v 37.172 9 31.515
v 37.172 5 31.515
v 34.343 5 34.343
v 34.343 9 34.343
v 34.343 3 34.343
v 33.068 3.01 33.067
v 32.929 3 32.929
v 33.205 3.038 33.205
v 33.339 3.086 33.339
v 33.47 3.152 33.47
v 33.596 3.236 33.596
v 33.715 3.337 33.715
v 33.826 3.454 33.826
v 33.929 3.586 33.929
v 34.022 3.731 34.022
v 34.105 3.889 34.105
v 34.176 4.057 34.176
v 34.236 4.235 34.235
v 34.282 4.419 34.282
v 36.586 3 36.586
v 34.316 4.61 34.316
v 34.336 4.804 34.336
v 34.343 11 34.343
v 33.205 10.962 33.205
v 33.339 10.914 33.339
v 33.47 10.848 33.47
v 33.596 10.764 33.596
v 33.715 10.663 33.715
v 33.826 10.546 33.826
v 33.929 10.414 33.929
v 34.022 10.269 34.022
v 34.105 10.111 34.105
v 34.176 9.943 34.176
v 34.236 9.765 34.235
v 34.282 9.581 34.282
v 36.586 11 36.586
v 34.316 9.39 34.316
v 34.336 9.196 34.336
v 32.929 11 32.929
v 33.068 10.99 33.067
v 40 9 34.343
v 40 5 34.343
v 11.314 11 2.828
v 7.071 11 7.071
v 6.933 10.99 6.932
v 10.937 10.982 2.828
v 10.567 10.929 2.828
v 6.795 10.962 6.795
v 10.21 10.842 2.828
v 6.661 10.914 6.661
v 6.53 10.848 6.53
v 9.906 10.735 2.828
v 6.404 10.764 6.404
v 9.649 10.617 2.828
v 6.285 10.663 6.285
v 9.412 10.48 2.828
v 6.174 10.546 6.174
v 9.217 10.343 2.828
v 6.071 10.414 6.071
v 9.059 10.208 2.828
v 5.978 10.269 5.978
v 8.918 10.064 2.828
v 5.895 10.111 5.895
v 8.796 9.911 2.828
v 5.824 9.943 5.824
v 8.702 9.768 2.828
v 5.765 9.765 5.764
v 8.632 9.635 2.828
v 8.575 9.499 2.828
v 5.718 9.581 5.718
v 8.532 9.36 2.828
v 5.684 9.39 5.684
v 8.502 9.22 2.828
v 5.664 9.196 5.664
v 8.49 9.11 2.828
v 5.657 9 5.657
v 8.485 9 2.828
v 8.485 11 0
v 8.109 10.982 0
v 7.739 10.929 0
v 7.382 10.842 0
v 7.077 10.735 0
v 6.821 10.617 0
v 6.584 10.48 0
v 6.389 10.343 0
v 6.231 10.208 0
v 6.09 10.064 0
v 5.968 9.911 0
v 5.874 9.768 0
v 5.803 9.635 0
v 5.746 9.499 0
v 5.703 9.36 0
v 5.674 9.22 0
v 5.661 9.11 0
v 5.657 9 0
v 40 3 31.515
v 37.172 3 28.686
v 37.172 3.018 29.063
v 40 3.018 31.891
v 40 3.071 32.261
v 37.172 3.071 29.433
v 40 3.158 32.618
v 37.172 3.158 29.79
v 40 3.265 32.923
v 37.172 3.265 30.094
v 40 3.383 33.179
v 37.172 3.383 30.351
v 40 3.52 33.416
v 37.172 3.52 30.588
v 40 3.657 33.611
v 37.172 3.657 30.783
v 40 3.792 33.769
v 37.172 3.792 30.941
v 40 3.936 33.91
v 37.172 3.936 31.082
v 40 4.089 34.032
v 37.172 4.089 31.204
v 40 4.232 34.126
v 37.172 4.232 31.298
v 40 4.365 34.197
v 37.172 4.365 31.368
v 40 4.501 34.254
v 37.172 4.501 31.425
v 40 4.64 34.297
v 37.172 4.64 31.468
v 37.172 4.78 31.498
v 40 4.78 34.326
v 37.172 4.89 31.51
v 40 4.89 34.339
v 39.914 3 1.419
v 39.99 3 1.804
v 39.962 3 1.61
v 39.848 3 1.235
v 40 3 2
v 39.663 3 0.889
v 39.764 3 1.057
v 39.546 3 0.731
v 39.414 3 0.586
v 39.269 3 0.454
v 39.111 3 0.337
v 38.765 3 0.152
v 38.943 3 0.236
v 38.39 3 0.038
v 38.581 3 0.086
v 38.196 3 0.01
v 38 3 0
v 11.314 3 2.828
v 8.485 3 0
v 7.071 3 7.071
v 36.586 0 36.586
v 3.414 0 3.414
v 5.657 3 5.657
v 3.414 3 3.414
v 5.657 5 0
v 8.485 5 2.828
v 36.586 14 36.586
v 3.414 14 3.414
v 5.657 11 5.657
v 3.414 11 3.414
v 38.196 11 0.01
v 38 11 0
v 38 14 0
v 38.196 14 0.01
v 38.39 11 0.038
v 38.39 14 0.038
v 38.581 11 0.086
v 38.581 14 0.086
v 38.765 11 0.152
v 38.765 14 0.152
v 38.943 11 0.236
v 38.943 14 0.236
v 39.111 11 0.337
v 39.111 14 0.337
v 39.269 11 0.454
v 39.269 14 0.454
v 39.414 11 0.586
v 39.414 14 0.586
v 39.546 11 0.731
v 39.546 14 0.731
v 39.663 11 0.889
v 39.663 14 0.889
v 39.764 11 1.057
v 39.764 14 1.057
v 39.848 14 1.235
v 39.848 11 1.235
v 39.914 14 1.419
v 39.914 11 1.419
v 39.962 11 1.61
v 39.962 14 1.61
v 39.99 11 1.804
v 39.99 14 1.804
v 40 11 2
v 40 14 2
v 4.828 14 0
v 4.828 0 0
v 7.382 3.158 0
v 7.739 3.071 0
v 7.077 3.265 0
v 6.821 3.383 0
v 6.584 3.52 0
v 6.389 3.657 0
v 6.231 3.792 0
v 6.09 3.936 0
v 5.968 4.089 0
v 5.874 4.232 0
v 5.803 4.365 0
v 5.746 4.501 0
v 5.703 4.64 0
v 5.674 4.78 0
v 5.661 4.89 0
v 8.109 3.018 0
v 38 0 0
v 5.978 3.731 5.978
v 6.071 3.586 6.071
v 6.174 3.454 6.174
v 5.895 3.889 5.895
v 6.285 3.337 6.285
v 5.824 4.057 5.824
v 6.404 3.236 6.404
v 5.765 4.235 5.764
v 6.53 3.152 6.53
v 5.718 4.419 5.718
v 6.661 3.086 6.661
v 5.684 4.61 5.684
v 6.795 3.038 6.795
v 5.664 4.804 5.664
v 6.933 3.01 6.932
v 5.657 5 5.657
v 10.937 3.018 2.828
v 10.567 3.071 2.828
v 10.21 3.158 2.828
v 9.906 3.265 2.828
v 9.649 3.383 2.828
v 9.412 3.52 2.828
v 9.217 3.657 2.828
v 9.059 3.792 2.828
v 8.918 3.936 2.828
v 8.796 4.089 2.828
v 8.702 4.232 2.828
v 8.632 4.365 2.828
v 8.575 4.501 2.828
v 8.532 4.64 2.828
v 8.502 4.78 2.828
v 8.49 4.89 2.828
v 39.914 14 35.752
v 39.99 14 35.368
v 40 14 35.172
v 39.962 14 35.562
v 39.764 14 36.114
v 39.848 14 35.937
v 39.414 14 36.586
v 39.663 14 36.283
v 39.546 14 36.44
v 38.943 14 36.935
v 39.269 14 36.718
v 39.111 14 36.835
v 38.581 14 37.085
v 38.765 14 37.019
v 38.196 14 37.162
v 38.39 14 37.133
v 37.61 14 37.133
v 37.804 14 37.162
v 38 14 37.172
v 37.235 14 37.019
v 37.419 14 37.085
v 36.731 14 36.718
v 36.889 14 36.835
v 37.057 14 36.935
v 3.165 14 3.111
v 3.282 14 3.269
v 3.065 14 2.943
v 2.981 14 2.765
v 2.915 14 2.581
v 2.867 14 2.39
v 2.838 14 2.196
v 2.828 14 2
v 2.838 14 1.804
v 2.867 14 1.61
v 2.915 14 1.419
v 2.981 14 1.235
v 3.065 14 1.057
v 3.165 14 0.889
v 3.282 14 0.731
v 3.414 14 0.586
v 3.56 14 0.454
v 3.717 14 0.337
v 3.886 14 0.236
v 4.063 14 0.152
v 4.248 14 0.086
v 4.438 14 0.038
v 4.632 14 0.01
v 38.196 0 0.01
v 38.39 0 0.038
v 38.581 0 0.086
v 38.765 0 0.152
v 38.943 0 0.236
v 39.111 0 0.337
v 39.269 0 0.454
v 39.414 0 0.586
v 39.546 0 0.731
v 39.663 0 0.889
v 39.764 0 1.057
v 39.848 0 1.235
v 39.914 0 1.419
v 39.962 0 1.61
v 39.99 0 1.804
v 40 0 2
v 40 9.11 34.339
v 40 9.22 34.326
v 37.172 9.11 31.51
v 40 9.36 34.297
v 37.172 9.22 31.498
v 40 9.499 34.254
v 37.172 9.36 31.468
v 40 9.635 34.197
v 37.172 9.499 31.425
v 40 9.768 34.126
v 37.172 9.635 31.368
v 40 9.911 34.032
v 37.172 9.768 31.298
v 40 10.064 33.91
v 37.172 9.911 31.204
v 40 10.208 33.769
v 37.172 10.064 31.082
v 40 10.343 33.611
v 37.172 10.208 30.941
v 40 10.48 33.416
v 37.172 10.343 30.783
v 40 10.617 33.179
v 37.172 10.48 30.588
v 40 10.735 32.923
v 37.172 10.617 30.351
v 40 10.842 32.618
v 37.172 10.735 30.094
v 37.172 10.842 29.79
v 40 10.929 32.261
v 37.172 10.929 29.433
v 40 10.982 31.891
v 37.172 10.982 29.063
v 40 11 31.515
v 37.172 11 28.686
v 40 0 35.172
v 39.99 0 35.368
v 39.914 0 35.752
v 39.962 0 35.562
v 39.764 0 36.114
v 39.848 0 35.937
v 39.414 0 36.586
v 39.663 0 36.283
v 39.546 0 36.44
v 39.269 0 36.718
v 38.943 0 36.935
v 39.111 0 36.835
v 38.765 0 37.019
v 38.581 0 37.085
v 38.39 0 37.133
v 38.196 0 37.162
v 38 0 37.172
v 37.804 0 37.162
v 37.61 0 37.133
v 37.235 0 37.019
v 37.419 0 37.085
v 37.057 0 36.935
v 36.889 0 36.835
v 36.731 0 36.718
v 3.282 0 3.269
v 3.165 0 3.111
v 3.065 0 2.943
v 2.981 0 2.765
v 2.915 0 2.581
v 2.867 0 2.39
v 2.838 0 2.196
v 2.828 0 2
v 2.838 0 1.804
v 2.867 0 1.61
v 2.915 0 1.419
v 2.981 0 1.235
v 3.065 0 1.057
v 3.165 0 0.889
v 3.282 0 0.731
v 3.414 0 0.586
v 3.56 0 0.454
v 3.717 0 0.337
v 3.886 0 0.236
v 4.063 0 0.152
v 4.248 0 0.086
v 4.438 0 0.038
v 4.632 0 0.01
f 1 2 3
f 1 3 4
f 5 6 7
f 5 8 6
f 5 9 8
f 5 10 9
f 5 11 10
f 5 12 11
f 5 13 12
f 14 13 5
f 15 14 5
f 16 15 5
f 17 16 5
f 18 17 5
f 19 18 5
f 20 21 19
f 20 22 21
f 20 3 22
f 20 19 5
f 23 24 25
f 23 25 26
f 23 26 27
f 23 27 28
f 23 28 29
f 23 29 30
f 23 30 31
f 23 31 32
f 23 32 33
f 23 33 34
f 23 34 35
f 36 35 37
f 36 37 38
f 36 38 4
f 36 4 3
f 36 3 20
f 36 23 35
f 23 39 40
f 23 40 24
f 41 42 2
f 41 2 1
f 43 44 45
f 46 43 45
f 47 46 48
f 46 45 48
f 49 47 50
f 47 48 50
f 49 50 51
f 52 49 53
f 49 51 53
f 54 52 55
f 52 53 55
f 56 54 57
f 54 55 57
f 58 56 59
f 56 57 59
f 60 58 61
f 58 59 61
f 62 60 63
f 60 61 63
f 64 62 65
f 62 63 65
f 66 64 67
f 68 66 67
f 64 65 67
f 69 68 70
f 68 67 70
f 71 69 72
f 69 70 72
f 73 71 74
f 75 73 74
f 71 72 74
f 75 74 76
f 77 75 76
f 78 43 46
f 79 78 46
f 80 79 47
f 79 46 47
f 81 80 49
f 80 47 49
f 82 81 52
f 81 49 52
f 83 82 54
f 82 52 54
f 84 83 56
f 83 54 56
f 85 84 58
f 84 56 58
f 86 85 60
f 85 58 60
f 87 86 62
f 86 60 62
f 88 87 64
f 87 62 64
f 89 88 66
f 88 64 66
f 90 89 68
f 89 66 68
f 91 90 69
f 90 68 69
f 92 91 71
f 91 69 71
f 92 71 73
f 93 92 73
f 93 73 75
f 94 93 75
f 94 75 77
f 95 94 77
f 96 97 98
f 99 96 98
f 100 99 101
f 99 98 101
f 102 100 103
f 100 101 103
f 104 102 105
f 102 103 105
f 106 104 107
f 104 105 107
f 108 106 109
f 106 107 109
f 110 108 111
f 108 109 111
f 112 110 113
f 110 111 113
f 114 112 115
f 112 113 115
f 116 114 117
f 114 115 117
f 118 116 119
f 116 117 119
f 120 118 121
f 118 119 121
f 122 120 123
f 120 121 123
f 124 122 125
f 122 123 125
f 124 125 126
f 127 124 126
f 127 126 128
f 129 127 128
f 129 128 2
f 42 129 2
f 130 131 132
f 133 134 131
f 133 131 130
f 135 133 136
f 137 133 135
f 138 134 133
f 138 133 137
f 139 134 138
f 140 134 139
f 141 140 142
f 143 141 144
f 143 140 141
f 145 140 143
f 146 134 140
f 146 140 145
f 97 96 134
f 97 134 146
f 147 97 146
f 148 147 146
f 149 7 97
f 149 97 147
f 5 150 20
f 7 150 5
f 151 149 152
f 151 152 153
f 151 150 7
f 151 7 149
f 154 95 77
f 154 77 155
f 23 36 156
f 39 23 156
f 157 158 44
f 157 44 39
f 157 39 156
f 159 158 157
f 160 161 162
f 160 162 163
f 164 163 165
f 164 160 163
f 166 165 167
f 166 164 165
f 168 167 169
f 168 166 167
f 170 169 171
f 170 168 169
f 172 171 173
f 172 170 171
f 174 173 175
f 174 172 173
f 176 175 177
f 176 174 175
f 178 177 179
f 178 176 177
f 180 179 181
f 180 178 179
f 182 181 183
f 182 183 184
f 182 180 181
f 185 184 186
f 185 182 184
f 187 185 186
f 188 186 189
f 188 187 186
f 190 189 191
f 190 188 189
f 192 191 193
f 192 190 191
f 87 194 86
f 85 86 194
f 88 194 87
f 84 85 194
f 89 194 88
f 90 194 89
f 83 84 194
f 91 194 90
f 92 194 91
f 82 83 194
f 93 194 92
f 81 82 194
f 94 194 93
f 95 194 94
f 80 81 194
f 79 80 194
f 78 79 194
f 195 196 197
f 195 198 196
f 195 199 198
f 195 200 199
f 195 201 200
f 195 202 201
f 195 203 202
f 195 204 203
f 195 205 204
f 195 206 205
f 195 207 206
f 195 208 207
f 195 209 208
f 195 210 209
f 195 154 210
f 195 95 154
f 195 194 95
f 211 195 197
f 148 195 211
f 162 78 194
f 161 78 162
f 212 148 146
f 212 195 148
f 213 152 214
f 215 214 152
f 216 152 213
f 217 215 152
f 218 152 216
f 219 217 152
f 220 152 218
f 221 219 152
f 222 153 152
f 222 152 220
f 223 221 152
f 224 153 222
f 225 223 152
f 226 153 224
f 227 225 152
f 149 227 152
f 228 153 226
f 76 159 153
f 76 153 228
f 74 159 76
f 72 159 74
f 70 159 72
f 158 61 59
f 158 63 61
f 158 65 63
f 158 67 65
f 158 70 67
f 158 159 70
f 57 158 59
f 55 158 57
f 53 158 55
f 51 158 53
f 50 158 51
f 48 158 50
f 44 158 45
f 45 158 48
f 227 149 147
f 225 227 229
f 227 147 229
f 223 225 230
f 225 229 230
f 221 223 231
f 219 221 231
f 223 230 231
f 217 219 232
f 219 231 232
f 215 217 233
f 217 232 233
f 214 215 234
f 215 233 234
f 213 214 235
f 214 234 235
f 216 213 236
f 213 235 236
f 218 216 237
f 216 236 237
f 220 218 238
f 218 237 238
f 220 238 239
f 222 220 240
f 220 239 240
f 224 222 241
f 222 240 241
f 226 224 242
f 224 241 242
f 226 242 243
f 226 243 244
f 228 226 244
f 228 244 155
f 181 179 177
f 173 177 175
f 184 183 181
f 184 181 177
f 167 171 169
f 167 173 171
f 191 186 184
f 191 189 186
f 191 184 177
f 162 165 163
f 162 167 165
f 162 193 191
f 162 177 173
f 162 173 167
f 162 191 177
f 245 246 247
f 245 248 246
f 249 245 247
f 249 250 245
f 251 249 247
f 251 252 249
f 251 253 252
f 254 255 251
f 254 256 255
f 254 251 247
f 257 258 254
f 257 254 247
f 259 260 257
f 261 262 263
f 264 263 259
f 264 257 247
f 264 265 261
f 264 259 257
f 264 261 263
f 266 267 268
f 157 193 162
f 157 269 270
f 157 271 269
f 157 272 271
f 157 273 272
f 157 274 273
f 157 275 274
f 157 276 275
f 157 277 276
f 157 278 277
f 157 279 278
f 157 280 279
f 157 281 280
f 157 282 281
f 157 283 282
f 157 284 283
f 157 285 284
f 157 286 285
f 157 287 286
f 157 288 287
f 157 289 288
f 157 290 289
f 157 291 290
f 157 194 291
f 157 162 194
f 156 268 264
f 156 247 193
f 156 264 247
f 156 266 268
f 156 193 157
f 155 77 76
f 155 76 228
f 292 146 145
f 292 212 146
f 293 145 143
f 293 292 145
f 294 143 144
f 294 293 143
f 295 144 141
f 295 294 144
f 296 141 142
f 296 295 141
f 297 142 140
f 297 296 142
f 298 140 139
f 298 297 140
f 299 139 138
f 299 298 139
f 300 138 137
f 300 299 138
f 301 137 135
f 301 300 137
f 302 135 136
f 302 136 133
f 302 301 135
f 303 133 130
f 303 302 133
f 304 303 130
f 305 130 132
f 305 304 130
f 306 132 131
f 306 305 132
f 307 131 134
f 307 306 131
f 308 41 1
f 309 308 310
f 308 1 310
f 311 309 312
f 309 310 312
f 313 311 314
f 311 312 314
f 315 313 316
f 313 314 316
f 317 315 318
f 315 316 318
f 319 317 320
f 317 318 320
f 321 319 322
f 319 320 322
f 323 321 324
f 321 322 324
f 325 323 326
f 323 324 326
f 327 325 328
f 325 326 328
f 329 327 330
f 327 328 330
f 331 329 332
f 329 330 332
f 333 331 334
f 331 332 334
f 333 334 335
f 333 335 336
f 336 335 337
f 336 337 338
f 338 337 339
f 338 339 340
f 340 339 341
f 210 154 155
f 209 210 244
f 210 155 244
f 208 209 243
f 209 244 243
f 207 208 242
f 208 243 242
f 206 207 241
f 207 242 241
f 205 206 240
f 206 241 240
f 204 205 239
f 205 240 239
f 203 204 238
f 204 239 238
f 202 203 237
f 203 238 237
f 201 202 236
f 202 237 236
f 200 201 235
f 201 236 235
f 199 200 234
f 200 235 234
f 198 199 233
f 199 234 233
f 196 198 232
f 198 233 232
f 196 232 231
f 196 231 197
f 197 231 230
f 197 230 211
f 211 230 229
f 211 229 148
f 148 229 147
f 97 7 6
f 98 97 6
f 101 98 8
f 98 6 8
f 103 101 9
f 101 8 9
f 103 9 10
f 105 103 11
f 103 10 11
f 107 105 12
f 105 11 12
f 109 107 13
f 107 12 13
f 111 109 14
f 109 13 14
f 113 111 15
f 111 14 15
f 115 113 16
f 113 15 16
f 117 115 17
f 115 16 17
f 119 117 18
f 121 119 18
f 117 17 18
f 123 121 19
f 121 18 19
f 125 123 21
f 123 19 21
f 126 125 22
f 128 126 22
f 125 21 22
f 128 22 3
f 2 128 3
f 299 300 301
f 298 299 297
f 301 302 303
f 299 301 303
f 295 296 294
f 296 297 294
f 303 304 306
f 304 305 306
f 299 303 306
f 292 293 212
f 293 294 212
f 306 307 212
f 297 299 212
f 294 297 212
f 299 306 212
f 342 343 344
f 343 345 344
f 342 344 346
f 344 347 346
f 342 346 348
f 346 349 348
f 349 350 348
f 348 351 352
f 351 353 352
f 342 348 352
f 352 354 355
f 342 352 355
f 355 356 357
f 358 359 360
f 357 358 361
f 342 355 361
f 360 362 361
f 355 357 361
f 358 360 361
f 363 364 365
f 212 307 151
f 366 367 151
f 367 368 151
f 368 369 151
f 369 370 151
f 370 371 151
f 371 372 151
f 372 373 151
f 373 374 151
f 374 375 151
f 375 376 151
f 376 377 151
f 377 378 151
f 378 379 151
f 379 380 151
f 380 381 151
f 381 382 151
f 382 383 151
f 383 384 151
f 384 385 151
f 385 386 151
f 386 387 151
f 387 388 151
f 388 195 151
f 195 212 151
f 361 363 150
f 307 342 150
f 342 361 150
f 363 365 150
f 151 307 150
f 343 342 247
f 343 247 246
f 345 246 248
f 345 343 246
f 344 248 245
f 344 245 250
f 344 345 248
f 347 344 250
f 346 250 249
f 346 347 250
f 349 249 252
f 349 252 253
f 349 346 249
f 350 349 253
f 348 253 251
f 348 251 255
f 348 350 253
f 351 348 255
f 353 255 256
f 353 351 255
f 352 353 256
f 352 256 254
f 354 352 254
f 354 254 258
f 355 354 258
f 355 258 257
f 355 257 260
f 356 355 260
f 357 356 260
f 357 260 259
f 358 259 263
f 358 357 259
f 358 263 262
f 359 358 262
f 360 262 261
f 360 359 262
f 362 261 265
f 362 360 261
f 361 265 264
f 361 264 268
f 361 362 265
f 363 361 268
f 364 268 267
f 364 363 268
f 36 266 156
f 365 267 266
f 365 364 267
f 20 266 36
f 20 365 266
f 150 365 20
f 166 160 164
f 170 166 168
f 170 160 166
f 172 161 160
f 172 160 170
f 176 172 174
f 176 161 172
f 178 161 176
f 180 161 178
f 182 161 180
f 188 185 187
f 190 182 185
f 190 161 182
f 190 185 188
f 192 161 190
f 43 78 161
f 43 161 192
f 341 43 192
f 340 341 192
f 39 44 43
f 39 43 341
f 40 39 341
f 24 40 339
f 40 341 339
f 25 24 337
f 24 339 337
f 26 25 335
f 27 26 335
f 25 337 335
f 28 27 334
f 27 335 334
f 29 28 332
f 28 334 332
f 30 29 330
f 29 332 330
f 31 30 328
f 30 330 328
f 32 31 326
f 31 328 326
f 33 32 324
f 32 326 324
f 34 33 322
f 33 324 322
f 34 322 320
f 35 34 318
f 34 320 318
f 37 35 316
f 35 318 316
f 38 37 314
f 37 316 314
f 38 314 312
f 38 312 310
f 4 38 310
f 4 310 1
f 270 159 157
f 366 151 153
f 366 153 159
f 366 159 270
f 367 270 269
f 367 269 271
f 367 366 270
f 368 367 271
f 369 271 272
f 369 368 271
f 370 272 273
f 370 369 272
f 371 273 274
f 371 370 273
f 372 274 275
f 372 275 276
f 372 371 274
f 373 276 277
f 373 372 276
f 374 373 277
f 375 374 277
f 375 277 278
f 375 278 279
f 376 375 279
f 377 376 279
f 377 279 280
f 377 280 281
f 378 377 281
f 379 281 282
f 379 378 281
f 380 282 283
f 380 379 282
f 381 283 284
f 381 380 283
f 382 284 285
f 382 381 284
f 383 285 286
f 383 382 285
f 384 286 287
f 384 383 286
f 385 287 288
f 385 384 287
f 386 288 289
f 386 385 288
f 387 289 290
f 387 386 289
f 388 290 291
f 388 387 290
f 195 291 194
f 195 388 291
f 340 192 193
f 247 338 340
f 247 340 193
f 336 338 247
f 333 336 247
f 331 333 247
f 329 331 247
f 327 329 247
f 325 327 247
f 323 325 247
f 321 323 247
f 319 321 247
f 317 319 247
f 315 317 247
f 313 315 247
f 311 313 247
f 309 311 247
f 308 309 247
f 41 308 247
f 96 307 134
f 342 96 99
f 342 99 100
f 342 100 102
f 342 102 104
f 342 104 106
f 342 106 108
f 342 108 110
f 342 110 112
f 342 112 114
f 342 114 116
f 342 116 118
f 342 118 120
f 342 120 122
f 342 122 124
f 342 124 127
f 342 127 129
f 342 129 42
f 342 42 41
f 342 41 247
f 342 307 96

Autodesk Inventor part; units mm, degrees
ref_plane "YZ Plane" through (0, 0, 0) normal (1, 0, 0) x (0, 1, 0)
ref_plane "XZ Plane" through (0, 0, 0) normal (0, 1, 0) x (-1, 0, 0)
ref_plane "XY Plane" through (0, 0, 0) normal (0, 0, 1) x (1, 0, 0)
sketch "Sketch1" plane through (0, 0, 0) normal (0, 1, 0) x (-1, 0, 0)
  line L0 (0, 0) -> (-40, 0)
  line L1 (-40, 0) -> (-40, 40)
  line L2 (-40, 40) -> (0, 0)
  dimension "d0" = 40
  dimension "d1" = 40
  dimension "d2" = 56.5685
extrude "Extrusion1" add sketch "Sketch1" along normal blind 14
sketch "Sketch2" plane through (40, 0, 40) normal (-0.7071068, 0, 0.7071068) x (0.7071068, 0, 0.7071068)
  line L0 (-56.5685, 0) -> (-56.5685, 14) construction
  line L1 (-56.5685, 7) -> (0, 7) construction
  line L2 (0, 0) -> (0, 14) construction
  line L3 (-52.5685, 11) -> (-4, 11)
  line L4 (-4, 11) -> (-4, 3)
  line L5 (-4, 3) -> (-52.5685, 3)
  line L6 (-52.5685, 3) -> (-52.5685, 11)
  line L7 (-52.5685, 11) -> (-4, 3) construction
  line L8 (-4, 11) -> (-52.5685, 3) construction
  point P0 (-28.2843, 7)
  dimension "d5" = 4
  dimension "d6" = 4
  dimension "d20" = 8
extrude "Extrusion2" cut sketch "Sketch2" against normal blind 28.75
fillet "Fillet1" radius 2 4 edges at (40, 12.5, 0) (40, 1.5, 0) (40, 7, 40) (0, 7, 0)
sketch "Sketch4" plane through (5.6569, 3, 0) normal (0.7071068, 0, 0.7071068) x (0.7071068, 0, -0.7071068)
  line L0 (-3.8204, 0) -> (-3.8204, 8) projected
  line L1 (-3.8204, 0) -> (0, 0) projected
  line L2 (0, 8) -> (0, 0) projected
  line L3 (-3.8204, 8) -> (0, 8) projected
  point P0 (-4, -3)
extrude "Extrusion3" add sketch "Sketch4" along normal blind 4
sketch "Sketch5" plane through (40, 3, 34.3431) normal (-0.7071068, 0, -0.7071068) x (-0.7071068, 0, 0.7071068)
  line L0 (3.8204, 8) -> (3.8204, 0) projected
  line L1 (3.8204, 8) -> (0, 8) projected
  line L2 (0, 0) -> (0, 8) projected
  line L3 (3.8204, 0) -> (0, 0) projected
  point P0 (4, -3)
extrude "Extrusion4" add sketch "Sketch5" along normal blind 4
sketch "Sketch6" plane through (37.2986, 3, 37.0445) normal (-0.7071068, 0, 0.7071068) x (0.7071068, 0, 0.7071068)
  line L0 (0, 8) -> (0, 0) projected
  line L1 (-4, 8) -> (0, 8) projected
  line L2 (-4, 0) -> (-4, 8) projected
  line L3 (0, 0) -> (-4, 0) projected
  point P0 (-52.5685, -3)
extrude "Extrusion5" add sketch "Sketch6" along normal up to surface (0.1796 mm away)
sketch "Sketch7" plane through (2.9555, 3, 2.7014) normal (-0.7071068, 0, 0.7071068) x (0.7071068, 0, 0.7071068)
  line L0 (0, 0) -> (0, 8) projected
  line L1 (4, 0) -> (0, 0) projected
  line L2 (4, 8) -> (4, 0) projected
  line L3 (0, 8) -> (4, 8) projected
  point P0 (-4, -3)
extrude "Extrusion6" add sketch "Sketch7" along normal up to surface (0.1796 mm away)
fillet "Fillet2" radius 2 2 edges at (37.1716, 7, 37.1716) (2.8284, 7, 2.8284)
fillet "Fillet3" radius 2 8 edges at (7.0711, 11, 4.2426) (7.0711, 3, 4.2426) (35.7574, 3, 32.9289) (35.7574, 11, 32.9289) (7.0711, 11, 1.4142) (7.0711, 3, 1.4142) (38.5858, 3, 32.9289) (38.5858, 11, 32.9289)
properties part number "table-corners"
